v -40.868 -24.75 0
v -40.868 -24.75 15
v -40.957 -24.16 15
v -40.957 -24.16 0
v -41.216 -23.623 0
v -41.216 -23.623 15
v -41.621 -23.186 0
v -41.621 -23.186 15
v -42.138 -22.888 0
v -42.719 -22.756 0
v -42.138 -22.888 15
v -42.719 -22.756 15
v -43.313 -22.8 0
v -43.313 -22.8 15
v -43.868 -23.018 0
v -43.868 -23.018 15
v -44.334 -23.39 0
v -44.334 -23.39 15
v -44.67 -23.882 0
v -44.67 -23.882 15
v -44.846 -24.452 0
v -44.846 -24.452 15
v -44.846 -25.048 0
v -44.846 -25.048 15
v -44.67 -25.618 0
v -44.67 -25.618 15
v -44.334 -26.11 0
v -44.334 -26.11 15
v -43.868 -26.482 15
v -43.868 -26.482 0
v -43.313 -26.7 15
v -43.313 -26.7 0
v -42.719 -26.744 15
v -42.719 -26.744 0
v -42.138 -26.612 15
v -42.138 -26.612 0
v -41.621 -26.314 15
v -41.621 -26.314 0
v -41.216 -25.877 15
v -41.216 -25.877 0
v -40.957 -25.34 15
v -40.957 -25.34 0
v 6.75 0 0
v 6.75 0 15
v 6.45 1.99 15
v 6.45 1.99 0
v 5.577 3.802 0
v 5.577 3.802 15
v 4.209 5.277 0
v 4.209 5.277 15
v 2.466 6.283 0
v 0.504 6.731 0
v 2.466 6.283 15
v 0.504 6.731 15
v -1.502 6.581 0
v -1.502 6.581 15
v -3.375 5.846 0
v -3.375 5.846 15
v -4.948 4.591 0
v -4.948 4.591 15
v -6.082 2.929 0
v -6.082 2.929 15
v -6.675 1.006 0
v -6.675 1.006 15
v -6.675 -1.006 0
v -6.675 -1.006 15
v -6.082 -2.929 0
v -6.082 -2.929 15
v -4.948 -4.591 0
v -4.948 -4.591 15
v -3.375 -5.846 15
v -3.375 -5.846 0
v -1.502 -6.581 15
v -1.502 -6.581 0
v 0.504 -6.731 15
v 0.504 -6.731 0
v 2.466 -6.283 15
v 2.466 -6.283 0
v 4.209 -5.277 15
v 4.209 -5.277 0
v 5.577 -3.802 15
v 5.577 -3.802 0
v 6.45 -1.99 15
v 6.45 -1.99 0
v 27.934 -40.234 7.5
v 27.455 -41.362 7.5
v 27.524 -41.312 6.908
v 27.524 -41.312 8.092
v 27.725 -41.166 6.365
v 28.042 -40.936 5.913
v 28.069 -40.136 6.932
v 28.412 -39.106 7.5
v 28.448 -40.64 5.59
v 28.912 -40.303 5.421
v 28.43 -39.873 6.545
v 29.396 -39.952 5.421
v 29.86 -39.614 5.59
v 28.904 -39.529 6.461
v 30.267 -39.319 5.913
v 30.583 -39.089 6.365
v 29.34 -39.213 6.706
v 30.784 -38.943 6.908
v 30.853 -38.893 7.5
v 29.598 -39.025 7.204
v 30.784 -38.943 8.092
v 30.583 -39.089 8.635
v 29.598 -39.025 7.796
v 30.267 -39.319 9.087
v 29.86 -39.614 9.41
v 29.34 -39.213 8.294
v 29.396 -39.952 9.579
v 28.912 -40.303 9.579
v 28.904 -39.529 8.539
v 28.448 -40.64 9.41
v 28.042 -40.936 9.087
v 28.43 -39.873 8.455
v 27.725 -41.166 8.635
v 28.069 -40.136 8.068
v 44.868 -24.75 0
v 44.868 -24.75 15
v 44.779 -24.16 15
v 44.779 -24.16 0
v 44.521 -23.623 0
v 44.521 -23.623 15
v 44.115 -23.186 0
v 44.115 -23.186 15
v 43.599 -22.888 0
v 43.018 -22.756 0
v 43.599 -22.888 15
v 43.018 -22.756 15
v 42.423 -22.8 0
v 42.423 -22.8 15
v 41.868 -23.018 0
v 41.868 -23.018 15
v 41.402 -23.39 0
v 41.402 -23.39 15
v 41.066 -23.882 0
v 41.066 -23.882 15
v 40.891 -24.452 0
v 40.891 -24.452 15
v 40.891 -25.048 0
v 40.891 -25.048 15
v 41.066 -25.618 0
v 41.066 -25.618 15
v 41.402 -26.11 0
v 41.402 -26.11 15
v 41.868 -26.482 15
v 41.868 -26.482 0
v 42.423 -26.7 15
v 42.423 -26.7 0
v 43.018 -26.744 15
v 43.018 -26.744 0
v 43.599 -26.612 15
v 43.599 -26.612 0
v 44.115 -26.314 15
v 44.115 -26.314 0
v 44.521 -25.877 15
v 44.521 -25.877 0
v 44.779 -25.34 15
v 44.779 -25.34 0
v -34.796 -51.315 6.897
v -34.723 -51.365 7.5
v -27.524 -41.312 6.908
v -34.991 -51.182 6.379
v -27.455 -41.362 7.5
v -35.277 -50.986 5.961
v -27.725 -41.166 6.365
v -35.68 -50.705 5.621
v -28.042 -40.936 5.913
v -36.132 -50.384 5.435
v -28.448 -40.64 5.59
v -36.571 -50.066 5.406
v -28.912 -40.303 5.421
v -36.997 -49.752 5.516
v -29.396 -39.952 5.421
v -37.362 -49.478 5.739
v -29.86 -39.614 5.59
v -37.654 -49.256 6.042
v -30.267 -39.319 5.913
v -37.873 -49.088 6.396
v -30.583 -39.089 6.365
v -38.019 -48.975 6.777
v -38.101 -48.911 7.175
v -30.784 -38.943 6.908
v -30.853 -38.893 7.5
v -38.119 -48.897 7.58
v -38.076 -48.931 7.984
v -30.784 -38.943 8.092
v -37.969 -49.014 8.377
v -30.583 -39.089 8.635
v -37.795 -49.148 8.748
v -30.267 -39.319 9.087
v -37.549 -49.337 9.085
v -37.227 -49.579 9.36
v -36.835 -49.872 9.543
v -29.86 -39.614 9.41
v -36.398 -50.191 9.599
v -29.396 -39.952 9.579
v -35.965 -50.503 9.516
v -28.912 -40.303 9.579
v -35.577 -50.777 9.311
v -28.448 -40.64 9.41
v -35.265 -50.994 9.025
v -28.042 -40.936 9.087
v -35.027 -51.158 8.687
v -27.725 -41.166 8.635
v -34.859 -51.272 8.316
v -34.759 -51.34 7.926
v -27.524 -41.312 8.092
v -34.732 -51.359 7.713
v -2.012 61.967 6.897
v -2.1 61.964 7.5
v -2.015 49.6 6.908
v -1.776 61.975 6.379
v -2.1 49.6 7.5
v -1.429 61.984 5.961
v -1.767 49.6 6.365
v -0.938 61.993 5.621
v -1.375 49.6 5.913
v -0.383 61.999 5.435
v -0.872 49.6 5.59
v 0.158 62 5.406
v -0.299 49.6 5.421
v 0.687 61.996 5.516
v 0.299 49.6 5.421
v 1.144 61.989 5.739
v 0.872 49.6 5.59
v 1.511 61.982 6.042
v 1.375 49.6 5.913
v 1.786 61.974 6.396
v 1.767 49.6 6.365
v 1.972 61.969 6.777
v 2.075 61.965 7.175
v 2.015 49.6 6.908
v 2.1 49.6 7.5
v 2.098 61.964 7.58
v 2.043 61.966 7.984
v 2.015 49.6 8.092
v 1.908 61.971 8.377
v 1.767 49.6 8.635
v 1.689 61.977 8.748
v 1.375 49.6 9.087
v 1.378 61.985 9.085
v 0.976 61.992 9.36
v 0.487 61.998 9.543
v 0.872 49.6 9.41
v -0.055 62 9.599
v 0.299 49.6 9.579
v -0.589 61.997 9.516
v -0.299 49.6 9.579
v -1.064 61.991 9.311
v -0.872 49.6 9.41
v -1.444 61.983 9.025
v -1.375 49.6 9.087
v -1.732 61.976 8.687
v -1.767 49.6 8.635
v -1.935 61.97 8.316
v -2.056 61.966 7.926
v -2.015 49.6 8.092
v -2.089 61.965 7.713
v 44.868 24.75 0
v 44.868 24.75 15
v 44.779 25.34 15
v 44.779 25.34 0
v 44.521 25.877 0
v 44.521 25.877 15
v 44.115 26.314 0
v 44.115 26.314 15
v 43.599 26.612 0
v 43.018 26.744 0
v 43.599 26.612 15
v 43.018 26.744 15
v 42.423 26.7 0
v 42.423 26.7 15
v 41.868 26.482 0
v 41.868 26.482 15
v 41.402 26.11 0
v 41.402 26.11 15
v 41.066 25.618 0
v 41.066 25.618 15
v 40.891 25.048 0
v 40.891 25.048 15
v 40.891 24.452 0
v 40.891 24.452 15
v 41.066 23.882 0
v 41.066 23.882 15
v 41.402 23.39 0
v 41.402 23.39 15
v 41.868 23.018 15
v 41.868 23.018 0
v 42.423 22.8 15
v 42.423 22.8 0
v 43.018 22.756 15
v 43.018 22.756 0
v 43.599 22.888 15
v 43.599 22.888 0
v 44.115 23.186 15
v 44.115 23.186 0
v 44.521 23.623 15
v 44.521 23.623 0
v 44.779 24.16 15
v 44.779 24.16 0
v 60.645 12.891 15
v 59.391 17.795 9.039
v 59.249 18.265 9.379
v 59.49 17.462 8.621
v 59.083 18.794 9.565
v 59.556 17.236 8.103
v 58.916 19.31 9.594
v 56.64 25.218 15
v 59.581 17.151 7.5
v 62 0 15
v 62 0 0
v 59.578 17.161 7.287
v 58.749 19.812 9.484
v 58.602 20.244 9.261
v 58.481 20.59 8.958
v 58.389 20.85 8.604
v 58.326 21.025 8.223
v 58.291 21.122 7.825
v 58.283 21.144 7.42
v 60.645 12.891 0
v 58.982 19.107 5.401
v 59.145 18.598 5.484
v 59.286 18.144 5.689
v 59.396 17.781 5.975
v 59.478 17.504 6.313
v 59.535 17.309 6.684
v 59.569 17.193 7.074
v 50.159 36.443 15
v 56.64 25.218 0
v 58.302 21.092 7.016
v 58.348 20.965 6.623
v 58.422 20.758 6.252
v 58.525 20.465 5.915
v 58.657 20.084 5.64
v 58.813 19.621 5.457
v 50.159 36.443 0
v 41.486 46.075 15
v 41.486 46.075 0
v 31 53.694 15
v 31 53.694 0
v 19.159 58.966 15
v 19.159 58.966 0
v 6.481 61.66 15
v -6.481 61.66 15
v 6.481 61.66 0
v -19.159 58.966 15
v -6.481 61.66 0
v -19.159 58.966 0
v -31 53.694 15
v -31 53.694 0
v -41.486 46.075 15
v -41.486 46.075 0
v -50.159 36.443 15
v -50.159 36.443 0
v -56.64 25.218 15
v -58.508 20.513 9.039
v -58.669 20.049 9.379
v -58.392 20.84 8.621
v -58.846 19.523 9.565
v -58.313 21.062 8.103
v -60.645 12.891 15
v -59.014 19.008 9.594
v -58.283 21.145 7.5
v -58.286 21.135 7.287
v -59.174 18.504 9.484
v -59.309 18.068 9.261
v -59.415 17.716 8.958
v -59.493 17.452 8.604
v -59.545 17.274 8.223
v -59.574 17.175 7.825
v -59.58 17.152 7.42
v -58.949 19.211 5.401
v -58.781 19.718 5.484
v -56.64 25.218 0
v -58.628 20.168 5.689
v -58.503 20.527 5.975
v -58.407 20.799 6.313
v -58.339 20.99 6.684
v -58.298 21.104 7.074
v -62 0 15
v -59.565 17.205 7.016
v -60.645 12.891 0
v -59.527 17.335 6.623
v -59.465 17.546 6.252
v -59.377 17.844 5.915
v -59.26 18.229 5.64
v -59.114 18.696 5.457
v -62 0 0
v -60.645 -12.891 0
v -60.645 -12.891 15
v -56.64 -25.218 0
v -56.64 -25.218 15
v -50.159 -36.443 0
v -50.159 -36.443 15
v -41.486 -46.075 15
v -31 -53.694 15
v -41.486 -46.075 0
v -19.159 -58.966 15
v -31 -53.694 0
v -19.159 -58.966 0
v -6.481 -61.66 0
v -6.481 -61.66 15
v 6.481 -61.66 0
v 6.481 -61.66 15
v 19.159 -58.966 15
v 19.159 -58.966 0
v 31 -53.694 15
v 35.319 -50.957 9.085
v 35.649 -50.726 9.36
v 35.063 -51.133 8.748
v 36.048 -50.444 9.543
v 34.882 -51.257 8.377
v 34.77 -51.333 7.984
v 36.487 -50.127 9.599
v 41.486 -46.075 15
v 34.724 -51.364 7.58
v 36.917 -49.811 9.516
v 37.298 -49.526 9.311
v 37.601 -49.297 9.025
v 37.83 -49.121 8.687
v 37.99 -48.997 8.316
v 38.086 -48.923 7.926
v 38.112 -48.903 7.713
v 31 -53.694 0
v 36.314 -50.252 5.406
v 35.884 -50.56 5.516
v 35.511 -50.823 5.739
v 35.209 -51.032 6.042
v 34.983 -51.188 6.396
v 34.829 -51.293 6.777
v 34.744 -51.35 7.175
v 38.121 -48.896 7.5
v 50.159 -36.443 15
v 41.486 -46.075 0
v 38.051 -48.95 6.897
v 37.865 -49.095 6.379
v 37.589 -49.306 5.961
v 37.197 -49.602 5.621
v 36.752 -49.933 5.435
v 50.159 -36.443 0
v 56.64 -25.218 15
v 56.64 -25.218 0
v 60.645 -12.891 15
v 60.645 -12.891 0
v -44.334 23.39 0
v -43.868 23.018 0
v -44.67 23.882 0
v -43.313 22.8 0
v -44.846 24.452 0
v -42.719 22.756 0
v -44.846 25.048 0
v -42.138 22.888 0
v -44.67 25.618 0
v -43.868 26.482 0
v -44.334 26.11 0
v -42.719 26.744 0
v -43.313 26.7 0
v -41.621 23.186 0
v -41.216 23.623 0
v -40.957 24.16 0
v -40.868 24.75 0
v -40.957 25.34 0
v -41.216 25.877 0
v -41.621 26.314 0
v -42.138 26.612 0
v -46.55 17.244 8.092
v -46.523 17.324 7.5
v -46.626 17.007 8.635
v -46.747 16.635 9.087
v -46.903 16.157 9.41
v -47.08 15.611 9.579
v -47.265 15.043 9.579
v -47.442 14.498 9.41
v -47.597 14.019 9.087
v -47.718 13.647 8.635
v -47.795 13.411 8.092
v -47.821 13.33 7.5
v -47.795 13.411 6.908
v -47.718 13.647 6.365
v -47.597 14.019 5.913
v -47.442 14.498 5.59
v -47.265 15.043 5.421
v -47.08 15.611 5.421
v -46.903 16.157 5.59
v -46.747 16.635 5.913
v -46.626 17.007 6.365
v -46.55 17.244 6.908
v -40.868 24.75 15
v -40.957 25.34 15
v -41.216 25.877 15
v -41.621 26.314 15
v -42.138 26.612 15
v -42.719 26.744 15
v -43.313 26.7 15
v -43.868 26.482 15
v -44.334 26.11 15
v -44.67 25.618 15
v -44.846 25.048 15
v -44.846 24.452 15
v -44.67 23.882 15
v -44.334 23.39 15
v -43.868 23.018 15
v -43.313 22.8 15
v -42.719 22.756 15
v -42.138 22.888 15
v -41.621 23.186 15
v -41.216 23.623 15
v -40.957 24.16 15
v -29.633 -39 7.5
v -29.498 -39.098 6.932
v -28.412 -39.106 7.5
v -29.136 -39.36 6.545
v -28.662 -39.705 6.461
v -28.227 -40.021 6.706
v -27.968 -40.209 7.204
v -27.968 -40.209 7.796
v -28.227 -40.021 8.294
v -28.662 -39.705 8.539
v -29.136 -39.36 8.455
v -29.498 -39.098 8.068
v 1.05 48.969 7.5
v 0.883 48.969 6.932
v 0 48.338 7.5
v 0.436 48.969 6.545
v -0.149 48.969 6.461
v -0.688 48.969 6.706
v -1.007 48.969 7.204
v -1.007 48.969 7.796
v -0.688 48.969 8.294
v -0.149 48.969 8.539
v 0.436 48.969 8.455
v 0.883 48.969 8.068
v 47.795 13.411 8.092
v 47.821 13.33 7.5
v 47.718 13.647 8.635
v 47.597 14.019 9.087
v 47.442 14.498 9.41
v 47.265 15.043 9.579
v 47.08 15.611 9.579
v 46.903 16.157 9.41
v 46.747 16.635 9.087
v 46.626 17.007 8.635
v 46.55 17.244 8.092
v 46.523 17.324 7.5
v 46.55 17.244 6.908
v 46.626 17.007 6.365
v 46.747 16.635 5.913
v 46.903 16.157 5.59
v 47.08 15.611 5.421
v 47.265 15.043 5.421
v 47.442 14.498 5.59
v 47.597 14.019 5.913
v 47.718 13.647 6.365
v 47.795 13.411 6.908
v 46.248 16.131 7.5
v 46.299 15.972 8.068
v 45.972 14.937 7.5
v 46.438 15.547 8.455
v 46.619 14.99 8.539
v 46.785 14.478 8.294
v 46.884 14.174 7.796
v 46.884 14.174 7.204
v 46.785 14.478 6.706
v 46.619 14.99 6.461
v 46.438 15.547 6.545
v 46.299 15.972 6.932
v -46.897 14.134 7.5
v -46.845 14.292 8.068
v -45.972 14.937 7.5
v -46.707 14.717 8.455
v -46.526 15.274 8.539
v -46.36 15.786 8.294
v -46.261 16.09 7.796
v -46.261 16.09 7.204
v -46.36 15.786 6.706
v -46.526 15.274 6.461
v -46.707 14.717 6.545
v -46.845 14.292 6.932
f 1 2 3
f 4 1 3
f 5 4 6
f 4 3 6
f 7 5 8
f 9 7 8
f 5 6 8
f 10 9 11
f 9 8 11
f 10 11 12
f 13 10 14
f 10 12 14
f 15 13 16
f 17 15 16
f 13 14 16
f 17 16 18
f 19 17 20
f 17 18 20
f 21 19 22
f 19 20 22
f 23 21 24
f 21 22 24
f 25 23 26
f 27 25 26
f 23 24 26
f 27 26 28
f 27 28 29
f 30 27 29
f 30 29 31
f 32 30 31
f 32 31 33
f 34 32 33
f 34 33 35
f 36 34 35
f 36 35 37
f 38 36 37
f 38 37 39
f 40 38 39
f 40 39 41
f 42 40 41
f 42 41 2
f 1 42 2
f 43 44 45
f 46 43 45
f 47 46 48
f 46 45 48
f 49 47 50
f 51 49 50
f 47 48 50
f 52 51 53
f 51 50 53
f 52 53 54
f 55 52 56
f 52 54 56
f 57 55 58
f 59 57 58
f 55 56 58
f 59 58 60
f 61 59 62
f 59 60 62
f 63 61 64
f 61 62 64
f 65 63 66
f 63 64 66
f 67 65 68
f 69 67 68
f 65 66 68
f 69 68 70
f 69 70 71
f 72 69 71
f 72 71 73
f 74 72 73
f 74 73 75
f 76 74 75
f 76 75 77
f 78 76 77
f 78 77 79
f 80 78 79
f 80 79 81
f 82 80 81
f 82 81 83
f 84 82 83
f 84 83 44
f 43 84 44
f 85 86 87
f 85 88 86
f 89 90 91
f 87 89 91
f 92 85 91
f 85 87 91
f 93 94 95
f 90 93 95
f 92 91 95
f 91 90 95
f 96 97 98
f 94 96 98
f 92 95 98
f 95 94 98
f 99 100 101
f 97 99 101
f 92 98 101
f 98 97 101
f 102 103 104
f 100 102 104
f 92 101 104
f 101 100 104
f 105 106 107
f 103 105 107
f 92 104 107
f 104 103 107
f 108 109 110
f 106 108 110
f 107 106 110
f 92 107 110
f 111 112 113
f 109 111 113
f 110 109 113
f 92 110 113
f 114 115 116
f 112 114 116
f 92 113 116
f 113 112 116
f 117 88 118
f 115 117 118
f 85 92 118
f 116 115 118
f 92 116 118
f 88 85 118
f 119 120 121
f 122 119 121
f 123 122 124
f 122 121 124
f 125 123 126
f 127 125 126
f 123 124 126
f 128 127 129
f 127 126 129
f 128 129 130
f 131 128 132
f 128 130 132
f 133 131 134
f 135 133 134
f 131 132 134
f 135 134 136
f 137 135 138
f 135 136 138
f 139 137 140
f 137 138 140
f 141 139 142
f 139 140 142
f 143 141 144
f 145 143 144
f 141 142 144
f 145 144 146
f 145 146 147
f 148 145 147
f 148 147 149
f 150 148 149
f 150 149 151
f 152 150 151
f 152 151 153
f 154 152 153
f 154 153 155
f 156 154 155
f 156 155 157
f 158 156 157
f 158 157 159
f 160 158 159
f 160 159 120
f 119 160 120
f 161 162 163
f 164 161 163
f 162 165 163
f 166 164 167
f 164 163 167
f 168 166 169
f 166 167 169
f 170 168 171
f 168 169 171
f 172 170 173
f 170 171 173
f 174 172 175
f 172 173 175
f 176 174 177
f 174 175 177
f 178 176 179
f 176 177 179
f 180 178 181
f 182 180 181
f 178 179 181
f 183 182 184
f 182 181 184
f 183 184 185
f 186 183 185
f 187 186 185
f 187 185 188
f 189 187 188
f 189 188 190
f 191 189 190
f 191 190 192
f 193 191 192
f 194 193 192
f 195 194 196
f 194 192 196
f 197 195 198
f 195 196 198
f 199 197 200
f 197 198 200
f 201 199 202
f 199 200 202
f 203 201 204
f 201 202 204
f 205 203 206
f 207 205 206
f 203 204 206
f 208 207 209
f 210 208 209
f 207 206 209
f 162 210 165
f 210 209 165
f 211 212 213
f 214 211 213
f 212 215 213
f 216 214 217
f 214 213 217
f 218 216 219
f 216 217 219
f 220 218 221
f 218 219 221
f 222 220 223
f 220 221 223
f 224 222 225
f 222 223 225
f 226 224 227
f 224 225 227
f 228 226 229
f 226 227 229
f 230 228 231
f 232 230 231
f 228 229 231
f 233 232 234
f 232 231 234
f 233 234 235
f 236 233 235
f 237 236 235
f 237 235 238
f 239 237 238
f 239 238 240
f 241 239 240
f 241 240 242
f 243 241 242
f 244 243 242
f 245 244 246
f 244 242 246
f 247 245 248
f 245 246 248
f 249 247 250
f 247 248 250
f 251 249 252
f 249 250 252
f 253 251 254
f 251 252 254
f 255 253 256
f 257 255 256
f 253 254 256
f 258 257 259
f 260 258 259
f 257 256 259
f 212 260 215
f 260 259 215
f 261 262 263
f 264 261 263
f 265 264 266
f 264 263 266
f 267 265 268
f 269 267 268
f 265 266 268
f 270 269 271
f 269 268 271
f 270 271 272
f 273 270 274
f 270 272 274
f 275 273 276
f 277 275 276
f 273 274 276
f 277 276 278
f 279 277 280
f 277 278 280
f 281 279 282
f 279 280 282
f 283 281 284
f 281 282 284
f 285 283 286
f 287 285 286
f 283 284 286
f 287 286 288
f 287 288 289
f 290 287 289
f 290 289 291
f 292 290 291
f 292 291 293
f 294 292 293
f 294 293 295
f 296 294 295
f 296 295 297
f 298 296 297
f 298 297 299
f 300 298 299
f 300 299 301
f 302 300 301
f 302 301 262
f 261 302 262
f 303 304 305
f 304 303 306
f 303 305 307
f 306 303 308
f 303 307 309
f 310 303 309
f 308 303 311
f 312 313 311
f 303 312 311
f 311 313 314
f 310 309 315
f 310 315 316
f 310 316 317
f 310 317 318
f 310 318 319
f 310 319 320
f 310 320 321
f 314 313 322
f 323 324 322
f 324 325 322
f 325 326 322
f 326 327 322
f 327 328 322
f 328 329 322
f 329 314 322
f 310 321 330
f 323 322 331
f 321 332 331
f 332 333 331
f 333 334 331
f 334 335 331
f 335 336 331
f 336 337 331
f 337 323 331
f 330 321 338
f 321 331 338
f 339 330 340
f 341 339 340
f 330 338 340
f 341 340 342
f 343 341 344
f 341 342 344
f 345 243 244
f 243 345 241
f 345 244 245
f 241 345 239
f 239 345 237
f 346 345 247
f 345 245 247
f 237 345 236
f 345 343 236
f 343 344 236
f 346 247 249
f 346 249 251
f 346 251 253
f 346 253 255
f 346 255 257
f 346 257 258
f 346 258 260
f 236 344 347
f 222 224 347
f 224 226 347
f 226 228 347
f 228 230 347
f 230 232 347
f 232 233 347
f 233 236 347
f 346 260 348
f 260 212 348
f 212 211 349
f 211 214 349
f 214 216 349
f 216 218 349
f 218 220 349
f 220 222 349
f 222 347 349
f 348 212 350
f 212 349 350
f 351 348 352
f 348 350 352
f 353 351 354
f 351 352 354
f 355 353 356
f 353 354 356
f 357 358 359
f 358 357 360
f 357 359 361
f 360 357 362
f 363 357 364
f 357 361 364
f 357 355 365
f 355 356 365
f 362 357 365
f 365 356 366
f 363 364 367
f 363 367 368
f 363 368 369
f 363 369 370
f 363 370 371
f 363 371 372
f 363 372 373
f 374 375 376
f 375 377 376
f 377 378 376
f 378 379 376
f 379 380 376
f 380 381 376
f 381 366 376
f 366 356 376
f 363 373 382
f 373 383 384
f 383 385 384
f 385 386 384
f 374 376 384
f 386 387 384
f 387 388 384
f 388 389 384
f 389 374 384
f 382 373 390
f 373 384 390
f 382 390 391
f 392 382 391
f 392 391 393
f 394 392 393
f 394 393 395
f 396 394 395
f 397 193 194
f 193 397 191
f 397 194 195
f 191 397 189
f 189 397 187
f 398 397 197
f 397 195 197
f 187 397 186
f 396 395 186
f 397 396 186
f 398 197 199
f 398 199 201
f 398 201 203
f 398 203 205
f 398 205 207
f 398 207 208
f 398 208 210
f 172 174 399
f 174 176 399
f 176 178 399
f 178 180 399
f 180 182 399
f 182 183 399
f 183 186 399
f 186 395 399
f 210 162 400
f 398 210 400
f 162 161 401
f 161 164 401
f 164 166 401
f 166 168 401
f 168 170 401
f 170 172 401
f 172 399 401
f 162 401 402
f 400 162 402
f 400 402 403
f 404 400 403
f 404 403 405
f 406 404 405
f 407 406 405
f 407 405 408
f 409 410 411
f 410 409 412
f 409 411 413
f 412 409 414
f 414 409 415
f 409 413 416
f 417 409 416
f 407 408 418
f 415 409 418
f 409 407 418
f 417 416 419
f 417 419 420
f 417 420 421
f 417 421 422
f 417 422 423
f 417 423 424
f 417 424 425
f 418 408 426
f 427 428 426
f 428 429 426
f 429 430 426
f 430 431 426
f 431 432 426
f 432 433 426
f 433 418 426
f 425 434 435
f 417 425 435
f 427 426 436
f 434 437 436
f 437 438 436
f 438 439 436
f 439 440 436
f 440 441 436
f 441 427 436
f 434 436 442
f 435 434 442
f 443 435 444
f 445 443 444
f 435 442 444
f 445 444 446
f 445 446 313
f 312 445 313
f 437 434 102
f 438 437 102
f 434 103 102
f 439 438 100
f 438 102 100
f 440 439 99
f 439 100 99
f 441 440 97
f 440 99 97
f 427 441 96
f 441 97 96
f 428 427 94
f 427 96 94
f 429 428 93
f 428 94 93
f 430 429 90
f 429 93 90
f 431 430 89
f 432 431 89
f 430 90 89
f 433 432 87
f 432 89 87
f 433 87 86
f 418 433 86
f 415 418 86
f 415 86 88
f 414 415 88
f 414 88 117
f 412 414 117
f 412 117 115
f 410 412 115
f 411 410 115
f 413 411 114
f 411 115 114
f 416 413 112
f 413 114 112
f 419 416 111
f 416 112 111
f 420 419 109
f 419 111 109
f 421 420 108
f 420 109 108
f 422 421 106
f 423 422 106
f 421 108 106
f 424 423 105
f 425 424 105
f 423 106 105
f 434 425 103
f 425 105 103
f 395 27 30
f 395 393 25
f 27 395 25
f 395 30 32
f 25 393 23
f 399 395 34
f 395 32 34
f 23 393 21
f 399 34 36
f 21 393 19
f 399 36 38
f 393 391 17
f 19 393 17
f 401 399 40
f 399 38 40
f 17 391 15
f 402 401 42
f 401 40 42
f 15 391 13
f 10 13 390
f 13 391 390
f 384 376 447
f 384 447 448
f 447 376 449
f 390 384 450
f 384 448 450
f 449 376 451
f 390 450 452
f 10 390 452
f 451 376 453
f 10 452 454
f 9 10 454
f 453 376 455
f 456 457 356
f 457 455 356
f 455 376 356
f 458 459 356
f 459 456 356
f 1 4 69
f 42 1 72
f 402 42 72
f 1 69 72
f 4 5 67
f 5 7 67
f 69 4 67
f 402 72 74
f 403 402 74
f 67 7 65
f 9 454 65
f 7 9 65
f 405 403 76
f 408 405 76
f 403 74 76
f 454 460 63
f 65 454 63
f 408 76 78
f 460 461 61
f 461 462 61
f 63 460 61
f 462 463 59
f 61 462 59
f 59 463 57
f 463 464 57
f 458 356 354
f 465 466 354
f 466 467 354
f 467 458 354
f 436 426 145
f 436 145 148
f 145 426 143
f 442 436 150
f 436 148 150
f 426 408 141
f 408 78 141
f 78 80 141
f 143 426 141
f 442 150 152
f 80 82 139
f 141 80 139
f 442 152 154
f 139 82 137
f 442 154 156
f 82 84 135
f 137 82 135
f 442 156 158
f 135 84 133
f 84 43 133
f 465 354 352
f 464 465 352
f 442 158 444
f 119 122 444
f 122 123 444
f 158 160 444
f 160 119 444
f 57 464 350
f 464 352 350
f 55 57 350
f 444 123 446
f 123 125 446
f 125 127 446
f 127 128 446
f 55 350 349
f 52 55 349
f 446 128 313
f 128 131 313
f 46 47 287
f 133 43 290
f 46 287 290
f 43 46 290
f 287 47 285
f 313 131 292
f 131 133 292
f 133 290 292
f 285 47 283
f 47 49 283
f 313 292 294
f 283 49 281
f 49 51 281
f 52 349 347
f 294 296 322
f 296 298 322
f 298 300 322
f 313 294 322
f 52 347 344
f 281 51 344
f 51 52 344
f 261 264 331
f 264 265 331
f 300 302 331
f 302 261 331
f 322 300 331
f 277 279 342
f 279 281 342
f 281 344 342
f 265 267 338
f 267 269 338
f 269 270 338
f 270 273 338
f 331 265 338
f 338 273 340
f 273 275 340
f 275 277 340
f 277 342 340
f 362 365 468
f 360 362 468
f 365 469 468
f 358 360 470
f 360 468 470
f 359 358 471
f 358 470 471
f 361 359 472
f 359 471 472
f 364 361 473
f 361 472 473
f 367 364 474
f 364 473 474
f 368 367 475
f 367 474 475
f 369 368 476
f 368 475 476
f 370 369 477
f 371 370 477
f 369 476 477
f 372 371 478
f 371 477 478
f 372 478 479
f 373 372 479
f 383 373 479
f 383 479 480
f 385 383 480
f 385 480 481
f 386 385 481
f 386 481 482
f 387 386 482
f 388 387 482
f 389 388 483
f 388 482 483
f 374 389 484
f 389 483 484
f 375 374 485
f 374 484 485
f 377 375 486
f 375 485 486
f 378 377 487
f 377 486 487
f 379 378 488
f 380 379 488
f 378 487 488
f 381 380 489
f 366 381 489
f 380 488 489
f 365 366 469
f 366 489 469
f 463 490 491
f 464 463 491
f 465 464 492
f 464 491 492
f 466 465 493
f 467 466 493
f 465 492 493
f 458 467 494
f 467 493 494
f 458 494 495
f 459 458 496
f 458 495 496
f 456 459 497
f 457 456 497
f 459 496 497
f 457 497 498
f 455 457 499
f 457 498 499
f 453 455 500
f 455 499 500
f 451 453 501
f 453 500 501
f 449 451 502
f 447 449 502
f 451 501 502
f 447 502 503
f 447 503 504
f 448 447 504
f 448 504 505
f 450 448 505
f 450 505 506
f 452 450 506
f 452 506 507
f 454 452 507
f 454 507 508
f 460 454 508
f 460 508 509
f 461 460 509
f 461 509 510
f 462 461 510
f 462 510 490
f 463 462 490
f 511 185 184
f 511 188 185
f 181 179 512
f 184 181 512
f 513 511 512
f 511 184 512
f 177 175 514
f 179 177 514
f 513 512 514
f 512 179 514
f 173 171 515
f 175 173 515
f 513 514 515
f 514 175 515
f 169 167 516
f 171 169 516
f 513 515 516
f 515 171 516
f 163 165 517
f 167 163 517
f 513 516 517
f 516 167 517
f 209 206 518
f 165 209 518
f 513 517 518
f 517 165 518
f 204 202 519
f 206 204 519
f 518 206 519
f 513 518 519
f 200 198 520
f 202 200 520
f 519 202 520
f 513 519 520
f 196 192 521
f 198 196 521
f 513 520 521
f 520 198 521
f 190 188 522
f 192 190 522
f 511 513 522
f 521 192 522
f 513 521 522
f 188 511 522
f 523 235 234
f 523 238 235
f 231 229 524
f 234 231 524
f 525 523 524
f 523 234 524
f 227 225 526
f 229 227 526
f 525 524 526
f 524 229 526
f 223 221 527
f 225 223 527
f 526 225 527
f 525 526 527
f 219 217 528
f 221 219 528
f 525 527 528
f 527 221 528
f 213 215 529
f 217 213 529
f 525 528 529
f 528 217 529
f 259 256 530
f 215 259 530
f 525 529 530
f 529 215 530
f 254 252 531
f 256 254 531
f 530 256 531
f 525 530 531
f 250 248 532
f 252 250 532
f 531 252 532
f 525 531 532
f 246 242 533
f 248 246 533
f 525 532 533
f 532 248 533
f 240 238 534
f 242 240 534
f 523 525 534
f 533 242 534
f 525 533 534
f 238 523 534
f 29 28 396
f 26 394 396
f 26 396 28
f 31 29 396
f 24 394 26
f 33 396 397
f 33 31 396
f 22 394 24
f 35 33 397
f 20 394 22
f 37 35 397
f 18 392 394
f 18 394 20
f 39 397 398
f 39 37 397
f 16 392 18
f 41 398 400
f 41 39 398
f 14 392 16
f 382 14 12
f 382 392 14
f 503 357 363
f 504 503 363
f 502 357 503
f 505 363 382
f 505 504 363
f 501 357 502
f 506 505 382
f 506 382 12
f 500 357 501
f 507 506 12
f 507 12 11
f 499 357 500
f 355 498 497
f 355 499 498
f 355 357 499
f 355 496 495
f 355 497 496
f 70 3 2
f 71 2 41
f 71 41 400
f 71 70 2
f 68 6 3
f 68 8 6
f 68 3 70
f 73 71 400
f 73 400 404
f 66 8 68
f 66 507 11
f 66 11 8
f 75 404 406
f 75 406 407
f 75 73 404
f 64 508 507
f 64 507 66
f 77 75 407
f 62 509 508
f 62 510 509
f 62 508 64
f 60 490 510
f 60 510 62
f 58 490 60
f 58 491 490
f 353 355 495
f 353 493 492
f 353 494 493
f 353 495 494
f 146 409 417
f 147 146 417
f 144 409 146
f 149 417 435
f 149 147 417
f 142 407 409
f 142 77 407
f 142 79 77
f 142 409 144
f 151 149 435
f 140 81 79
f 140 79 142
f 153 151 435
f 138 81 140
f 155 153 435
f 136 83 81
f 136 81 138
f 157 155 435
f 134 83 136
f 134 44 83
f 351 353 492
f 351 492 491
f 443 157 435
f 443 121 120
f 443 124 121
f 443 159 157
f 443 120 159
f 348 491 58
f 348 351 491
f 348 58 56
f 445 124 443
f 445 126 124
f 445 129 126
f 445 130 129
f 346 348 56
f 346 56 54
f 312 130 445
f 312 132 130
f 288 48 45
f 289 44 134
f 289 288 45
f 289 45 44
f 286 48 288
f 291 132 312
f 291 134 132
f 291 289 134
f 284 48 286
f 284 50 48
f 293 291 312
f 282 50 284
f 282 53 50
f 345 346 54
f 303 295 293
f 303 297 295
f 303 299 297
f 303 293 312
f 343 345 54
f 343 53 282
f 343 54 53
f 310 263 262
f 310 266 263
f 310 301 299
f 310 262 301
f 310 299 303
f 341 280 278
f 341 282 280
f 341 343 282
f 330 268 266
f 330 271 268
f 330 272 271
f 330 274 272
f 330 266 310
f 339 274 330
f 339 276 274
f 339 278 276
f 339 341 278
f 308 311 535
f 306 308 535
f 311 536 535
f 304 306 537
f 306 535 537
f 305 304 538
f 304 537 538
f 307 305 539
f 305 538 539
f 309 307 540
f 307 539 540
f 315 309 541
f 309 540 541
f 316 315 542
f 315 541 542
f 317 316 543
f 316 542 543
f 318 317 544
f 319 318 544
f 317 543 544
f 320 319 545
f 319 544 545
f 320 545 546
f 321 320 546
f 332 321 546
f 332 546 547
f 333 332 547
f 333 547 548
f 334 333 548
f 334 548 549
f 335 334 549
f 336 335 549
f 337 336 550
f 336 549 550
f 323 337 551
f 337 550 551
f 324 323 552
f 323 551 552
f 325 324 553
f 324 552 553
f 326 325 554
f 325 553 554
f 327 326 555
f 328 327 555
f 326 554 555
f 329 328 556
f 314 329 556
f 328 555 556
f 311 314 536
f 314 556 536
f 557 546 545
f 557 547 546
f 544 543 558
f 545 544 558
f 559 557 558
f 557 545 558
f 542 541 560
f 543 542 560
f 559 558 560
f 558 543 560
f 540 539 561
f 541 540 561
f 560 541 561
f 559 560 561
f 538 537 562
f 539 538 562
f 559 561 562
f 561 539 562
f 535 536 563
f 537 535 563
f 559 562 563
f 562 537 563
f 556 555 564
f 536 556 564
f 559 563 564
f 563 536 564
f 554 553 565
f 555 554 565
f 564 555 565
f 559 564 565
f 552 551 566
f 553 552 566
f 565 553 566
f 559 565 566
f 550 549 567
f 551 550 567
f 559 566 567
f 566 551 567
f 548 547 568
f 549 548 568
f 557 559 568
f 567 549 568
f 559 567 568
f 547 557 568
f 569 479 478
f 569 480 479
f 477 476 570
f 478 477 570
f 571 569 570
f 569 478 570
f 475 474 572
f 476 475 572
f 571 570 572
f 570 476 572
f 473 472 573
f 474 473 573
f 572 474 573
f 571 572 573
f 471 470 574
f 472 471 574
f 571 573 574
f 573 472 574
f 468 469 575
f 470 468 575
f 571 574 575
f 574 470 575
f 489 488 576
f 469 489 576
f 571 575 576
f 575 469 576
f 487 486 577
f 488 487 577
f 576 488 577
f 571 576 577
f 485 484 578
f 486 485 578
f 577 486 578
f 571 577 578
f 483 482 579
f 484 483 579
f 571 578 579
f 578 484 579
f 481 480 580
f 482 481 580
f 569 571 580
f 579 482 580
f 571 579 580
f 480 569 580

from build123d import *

# Parameters (mm, degrees)
SKETCH1_R                       = 62
BOSS_EXTRUDE1_DEPTH             = 15
F_4_0_4_DIAMETER_HOLE1_D        = 4
M12_CLEARANCE_HOLE1_D           = 13.5
M5_TAPPED_HOLE1_D               = 4.2
M5_TAPPED_HOLE1_DEPTH           = 12.4
M5_TAPPED_HOLE1_TIP             = 1.2618073
M5_TAPPED_HOLE1_ON_FACE_2_D     = 4.2
M5_TAPPED_HOLE1_ON_FACE_2_DEPTH = 12.4
M5_TAPPED_HOLE1_ON_FACE_2_TIP   = 1.2618073
M5_TAPPED_HOLE1_ON_FACE_3_D     = 4.2
M5_TAPPED_HOLE1_ON_FACE_3_DEPTH = 12.4
M5_TAPPED_HOLE1_ON_FACE_3_TIP   = 1.2618073
M5_TAPPED_HOLE1_ON_FACE_4_D     = 4.2
M5_TAPPED_HOLE1_ON_FACE_4_DEPTH = 12.4
M5_TAPPED_HOLE1_ON_FACE_4_TIP   = 1.2618073
M5_TAPPED_HOLE1_ON_FACE_5_D     = 4.2
M5_TAPPED_HOLE1_ON_FACE_5_DEPTH = 12.4
M5_TAPPED_HOLE1_ON_FACE_5_TIP   = 1.2618073


with BuildPart() as part:
    # Sketch1 → Boss-Extrude1 (new body)
    with BuildSketch(Plane.XY):
        Circle(SKETCH1_R)
    extrude(amount=BOSS_EXTRUDE1_DEPTH)

    # Ø4.0 (4) Diameter Hole1 (through all)
    with Locations(Plane(origin=(0, 0, 0), x_dir=(-1, 0, 0), z_dir=(0, 0, -1))):
        with Locations((-42.868257487, 24.75), (-42.868257487, -24.75), (42.868257487, -24.75), (42.868257487, 24.75)):
            Hole(F_4_0_4_DIAMETER_HOLE1_D / 2)

    # M12 Clearance Hole1 (through all)
    with Locations(Plane(origin=(0, 0, 0), x_dir=(-1, 0, 0), z_dir=(0, 0, -1))):
        with Locations((0, 0)):
            Hole(M12_CLEARANCE_HOLE1_D / 2)

    # M5 Tapped Hole1
    with Locations(Plane(origin=(0, 62, 7.5), x_dir=(1, 0, 0), z_dir=(0, 1, 0))):
        with Locations((0, 0)):
            Hole(M5_TAPPED_HOLE1_D / 2, depth=M5_TAPPED_HOLE1_DEPTH)
            with Locations((0, 0, -(M5_TAPPED_HOLE1_DEPTH + M5_TAPPED_HOLE1_TIP / 2))):  # 118° drill point
                Cone(0, M5_TAPPED_HOLE1_D / 2, M5_TAPPED_HOLE1_TIP, mode=Mode.SUBTRACT)

    # M5 Tapped Hole1 on face 2
    with Locations(Plane(origin=(58.96550401, 19.159053651, 7.5), x_dir=(-0.309016857306, 0.951056560832, 0), z_dir=(0.951056560832, 0.309016857306, 0))):
        with Locations((0, 0)):
            Hole(M5_TAPPED_HOLE1_ON_FACE_2_D / 2, depth=M5_TAPPED_HOLE1_ON_FACE_2_DEPTH)
            with Locations((0, 0, -(M5_TAPPED_HOLE1_ON_FACE_2_DEPTH + M5_TAPPED_HOLE1_ON_FACE_2_TIP / 2))):  # 118° drill point
                Cone(0, M5_TAPPED_HOLE1_ON_FACE_2_D / 2, M5_TAPPED_HOLE1_ON_FACE_2_TIP, mode=Mode.SUBTRACT)

    # M5 Tapped Hole1 on face 3
    with Locations(Plane(origin=(36.442685642, -50.159053651, 7.5), x_dir=(-0.809017116291, -0.58778508449, 0), z_dir=(0.58778508449, -0.809017116291, 0))):
        with Locations((0, 0)):
            Hole(M5_TAPPED_HOLE1_ON_FACE_3_D / 2, depth=M5_TAPPED_HOLE1_ON_FACE_3_DEPTH)
            with Locations((0, 0, -(M5_TAPPED_HOLE1_ON_FACE_3_DEPTH + M5_TAPPED_HOLE1_ON_FACE_3_TIP / 2))):  # 118° drill point
                Cone(0, M5_TAPPED_HOLE1_ON_FACE_3_D / 2, M5_TAPPED_HOLE1_ON_FACE_3_TIP, mode=Mode.SUBTRACT)

    # M5 Tapped Hole1 on face 4
    with Locations(Plane(origin=(-36.442685642, -50.159053651, 7.5), x_dir=(-0.809017116291, 0.58778508449, 0), z_dir=(-0.58778508449, -0.809017116291, 0))):
        with Locations((0, 0)):
            Hole(M5_TAPPED_HOLE1_ON_FACE_4_D / 2, depth=M5_TAPPED_HOLE1_ON_FACE_4_DEPTH)
            with Locations((0, 0, -(M5_TAPPED_HOLE1_ON_FACE_4_DEPTH + M5_TAPPED_HOLE1_ON_FACE_4_TIP / 2))):  # 118° drill point
                Cone(0, M5_TAPPED_HOLE1_ON_FACE_4_D / 2, M5_TAPPED_HOLE1_ON_FACE_4_TIP, mode=Mode.SUBTRACT)

    # M5 Tapped Hole1 on face 5
    with Locations(Plane(origin=(-58.96550401, 19.159053651, 7.5), x_dir=(-0.309016857306, -0.951056560832, 0), z_dir=(-0.951056560832, 0.309016857306, 0))):
        with Locations((0, 0)):
            Hole(M5_TAPPED_HOLE1_ON_FACE_5_D / 2, depth=M5_TAPPED_HOLE1_ON_FACE_5_DEPTH)
            with Locations((0, 0, -(M5_TAPPED_HOLE1_ON_FACE_5_DEPTH + M5_TAPPED_HOLE1_ON_FACE_5_TIP / 2))):  # 118° drill point
                Cone(0, M5_TAPPED_HOLE1_ON_FACE_5_D / 2, M5_TAPPED_HOLE1_ON_FACE_5_TIP, mode=Mode.SUBTRACT)


solid = part.part
